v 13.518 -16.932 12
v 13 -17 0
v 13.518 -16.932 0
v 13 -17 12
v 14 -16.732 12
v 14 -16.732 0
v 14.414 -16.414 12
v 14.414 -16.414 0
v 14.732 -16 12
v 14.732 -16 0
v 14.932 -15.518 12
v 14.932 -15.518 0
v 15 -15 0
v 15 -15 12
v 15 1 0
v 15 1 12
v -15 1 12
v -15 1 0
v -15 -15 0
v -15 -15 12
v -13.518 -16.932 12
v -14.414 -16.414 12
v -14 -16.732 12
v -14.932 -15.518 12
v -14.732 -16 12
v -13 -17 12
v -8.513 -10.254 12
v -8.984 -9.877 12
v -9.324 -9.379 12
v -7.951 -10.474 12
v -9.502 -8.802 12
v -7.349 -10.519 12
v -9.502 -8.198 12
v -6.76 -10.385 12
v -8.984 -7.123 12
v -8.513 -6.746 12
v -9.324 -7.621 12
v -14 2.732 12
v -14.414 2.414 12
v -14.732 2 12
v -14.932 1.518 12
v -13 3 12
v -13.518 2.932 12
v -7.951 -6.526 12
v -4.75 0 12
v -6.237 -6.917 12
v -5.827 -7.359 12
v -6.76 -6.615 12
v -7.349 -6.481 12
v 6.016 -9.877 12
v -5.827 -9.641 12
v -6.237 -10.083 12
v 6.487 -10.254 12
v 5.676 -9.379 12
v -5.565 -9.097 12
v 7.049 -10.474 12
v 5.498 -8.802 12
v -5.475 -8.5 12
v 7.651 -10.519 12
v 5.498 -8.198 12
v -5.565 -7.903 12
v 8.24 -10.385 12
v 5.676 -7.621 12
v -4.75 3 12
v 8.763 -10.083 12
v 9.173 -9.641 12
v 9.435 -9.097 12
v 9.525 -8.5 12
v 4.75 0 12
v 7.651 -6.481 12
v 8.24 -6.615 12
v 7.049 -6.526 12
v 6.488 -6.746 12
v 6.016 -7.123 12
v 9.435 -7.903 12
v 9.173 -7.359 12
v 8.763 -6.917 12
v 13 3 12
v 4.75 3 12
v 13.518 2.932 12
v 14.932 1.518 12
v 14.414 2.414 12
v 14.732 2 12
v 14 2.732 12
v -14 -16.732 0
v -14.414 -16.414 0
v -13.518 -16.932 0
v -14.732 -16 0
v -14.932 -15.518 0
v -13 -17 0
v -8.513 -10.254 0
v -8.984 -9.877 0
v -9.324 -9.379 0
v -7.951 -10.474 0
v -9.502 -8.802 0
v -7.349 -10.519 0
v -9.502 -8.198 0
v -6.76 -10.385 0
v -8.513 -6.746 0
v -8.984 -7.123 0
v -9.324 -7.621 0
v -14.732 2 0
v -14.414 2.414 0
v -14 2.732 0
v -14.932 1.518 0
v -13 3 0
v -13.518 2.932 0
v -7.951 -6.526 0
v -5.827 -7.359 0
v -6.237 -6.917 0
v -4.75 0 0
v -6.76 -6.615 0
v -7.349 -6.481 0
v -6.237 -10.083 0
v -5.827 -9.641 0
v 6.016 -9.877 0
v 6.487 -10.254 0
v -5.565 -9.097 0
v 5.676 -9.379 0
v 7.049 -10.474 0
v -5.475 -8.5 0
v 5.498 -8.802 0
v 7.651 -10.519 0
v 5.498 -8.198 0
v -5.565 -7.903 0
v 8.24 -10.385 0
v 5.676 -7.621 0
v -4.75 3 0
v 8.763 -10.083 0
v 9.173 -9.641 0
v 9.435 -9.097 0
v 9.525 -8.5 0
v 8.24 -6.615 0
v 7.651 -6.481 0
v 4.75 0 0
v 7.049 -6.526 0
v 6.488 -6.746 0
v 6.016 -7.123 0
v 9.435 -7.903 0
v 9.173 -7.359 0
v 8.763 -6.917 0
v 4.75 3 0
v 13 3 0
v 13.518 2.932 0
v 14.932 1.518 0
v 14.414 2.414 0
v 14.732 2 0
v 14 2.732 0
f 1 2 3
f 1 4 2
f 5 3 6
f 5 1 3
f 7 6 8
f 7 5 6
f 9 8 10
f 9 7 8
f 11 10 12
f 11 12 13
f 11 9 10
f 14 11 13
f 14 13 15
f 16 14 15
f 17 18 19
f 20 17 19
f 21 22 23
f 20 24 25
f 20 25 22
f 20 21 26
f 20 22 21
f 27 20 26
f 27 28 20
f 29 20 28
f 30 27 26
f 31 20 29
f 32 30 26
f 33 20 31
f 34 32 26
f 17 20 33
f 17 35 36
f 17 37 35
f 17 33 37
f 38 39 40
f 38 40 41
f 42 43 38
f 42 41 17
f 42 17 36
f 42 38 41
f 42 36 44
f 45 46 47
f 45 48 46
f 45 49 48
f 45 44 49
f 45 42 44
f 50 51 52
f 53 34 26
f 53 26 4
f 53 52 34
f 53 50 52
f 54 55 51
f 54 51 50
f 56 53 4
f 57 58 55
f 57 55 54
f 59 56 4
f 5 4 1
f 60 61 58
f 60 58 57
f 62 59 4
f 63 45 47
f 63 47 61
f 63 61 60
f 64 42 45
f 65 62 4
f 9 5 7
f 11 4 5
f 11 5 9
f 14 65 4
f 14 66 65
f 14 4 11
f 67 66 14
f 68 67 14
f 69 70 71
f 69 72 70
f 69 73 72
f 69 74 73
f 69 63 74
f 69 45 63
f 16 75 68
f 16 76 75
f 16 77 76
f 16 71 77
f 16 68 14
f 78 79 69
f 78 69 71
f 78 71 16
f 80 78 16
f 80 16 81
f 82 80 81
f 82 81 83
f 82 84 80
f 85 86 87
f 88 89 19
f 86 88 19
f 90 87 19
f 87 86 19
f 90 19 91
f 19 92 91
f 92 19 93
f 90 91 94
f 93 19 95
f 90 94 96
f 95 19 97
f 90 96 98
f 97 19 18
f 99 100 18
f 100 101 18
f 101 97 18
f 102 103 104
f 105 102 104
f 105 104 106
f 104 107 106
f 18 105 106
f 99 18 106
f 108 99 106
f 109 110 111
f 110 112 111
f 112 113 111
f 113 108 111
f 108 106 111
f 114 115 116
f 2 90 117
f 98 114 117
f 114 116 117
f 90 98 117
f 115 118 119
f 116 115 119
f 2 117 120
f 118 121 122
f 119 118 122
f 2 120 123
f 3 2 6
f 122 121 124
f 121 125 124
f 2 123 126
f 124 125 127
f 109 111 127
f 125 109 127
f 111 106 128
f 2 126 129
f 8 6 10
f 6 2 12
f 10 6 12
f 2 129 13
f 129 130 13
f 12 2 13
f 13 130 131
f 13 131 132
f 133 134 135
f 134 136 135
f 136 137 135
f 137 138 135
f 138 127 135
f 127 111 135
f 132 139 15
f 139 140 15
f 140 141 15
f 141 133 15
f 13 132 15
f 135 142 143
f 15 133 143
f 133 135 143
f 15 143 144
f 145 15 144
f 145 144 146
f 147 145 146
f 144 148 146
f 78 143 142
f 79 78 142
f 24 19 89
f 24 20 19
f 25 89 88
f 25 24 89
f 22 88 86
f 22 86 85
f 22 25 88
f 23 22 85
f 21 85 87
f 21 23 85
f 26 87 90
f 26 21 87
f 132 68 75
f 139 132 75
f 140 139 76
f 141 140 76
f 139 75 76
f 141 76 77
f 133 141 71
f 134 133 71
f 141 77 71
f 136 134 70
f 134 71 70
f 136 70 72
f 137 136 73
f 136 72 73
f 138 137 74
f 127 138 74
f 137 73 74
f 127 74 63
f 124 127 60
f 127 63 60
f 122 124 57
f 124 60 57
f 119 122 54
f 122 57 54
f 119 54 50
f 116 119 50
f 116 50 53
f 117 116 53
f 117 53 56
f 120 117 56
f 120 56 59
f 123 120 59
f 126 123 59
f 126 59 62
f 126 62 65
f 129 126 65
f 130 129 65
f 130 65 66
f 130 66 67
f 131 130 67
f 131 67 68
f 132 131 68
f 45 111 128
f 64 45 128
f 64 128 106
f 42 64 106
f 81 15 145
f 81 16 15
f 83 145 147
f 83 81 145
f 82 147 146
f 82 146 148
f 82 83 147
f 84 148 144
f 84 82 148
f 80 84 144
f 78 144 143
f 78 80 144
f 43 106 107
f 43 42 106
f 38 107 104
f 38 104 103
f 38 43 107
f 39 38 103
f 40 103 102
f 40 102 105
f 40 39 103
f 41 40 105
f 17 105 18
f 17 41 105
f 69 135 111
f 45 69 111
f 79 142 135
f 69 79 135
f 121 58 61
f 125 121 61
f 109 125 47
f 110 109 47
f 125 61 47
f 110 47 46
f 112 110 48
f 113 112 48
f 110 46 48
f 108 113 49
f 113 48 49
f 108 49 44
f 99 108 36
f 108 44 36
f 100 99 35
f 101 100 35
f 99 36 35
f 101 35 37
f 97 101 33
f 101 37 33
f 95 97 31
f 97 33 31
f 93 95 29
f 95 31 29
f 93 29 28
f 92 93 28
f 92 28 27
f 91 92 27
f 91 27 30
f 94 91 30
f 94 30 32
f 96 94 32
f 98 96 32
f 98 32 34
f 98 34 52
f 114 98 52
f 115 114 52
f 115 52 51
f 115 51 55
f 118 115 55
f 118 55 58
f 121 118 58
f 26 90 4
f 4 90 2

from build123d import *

# Parameters (mm, degrees)
EXTRUDE_1_DEPTH          = 12
FILLET_1_R               = 2
SKETCH_2_R               = 2.025
CUT_EXTRUDE_1_DEPTH      = 1
CUT_EXTRUDE_1_DEPTH_BACK = 13


with BuildPart() as part:
    # 草图1 → 凸台-拉伸1 (new body)
    with BuildSketch(Plane.XY):
        Polygon((4.75, 0), (-4.75, 0), (-4.75, 3), (-15, 3), (-15, -17), (15, -17), (15, 3), (4.75, 3), align=None)
    extrude(amount=EXTRUDE_1_DEPTH)

    # 圆角1
    fillet_1_edges = [part.edges().sort_by_distance(p)[0] for p in [
        (15, 3, 6),
        (15, -17, 6),
        (-15, -17, 6),
        (-15, 3, 6),
    ]]
    fillet(fillet_1_edges, radius=FILLET_1_R)

    # 草图2 → 切除-拉伸1 (cut, two sides)
    with BuildSketch(Plane.XY.offset(12)) as cut_extrude_1_sk:
        with Locations((-7.5, -8.5)):
            Circle(SKETCH_2_R)
        with Locations((7.5, -8.5)):
            Circle(SKETCH_2_R)
    extrude(amount=CUT_EXTRUDE_1_DEPTH, mode=Mode.SUBTRACT)
    extrude(cut_extrude_1_sk.sketch, amount=-CUT_EXTRUDE_1_DEPTH_BACK, mode=Mode.SUBTRACT)


solid = part.part
